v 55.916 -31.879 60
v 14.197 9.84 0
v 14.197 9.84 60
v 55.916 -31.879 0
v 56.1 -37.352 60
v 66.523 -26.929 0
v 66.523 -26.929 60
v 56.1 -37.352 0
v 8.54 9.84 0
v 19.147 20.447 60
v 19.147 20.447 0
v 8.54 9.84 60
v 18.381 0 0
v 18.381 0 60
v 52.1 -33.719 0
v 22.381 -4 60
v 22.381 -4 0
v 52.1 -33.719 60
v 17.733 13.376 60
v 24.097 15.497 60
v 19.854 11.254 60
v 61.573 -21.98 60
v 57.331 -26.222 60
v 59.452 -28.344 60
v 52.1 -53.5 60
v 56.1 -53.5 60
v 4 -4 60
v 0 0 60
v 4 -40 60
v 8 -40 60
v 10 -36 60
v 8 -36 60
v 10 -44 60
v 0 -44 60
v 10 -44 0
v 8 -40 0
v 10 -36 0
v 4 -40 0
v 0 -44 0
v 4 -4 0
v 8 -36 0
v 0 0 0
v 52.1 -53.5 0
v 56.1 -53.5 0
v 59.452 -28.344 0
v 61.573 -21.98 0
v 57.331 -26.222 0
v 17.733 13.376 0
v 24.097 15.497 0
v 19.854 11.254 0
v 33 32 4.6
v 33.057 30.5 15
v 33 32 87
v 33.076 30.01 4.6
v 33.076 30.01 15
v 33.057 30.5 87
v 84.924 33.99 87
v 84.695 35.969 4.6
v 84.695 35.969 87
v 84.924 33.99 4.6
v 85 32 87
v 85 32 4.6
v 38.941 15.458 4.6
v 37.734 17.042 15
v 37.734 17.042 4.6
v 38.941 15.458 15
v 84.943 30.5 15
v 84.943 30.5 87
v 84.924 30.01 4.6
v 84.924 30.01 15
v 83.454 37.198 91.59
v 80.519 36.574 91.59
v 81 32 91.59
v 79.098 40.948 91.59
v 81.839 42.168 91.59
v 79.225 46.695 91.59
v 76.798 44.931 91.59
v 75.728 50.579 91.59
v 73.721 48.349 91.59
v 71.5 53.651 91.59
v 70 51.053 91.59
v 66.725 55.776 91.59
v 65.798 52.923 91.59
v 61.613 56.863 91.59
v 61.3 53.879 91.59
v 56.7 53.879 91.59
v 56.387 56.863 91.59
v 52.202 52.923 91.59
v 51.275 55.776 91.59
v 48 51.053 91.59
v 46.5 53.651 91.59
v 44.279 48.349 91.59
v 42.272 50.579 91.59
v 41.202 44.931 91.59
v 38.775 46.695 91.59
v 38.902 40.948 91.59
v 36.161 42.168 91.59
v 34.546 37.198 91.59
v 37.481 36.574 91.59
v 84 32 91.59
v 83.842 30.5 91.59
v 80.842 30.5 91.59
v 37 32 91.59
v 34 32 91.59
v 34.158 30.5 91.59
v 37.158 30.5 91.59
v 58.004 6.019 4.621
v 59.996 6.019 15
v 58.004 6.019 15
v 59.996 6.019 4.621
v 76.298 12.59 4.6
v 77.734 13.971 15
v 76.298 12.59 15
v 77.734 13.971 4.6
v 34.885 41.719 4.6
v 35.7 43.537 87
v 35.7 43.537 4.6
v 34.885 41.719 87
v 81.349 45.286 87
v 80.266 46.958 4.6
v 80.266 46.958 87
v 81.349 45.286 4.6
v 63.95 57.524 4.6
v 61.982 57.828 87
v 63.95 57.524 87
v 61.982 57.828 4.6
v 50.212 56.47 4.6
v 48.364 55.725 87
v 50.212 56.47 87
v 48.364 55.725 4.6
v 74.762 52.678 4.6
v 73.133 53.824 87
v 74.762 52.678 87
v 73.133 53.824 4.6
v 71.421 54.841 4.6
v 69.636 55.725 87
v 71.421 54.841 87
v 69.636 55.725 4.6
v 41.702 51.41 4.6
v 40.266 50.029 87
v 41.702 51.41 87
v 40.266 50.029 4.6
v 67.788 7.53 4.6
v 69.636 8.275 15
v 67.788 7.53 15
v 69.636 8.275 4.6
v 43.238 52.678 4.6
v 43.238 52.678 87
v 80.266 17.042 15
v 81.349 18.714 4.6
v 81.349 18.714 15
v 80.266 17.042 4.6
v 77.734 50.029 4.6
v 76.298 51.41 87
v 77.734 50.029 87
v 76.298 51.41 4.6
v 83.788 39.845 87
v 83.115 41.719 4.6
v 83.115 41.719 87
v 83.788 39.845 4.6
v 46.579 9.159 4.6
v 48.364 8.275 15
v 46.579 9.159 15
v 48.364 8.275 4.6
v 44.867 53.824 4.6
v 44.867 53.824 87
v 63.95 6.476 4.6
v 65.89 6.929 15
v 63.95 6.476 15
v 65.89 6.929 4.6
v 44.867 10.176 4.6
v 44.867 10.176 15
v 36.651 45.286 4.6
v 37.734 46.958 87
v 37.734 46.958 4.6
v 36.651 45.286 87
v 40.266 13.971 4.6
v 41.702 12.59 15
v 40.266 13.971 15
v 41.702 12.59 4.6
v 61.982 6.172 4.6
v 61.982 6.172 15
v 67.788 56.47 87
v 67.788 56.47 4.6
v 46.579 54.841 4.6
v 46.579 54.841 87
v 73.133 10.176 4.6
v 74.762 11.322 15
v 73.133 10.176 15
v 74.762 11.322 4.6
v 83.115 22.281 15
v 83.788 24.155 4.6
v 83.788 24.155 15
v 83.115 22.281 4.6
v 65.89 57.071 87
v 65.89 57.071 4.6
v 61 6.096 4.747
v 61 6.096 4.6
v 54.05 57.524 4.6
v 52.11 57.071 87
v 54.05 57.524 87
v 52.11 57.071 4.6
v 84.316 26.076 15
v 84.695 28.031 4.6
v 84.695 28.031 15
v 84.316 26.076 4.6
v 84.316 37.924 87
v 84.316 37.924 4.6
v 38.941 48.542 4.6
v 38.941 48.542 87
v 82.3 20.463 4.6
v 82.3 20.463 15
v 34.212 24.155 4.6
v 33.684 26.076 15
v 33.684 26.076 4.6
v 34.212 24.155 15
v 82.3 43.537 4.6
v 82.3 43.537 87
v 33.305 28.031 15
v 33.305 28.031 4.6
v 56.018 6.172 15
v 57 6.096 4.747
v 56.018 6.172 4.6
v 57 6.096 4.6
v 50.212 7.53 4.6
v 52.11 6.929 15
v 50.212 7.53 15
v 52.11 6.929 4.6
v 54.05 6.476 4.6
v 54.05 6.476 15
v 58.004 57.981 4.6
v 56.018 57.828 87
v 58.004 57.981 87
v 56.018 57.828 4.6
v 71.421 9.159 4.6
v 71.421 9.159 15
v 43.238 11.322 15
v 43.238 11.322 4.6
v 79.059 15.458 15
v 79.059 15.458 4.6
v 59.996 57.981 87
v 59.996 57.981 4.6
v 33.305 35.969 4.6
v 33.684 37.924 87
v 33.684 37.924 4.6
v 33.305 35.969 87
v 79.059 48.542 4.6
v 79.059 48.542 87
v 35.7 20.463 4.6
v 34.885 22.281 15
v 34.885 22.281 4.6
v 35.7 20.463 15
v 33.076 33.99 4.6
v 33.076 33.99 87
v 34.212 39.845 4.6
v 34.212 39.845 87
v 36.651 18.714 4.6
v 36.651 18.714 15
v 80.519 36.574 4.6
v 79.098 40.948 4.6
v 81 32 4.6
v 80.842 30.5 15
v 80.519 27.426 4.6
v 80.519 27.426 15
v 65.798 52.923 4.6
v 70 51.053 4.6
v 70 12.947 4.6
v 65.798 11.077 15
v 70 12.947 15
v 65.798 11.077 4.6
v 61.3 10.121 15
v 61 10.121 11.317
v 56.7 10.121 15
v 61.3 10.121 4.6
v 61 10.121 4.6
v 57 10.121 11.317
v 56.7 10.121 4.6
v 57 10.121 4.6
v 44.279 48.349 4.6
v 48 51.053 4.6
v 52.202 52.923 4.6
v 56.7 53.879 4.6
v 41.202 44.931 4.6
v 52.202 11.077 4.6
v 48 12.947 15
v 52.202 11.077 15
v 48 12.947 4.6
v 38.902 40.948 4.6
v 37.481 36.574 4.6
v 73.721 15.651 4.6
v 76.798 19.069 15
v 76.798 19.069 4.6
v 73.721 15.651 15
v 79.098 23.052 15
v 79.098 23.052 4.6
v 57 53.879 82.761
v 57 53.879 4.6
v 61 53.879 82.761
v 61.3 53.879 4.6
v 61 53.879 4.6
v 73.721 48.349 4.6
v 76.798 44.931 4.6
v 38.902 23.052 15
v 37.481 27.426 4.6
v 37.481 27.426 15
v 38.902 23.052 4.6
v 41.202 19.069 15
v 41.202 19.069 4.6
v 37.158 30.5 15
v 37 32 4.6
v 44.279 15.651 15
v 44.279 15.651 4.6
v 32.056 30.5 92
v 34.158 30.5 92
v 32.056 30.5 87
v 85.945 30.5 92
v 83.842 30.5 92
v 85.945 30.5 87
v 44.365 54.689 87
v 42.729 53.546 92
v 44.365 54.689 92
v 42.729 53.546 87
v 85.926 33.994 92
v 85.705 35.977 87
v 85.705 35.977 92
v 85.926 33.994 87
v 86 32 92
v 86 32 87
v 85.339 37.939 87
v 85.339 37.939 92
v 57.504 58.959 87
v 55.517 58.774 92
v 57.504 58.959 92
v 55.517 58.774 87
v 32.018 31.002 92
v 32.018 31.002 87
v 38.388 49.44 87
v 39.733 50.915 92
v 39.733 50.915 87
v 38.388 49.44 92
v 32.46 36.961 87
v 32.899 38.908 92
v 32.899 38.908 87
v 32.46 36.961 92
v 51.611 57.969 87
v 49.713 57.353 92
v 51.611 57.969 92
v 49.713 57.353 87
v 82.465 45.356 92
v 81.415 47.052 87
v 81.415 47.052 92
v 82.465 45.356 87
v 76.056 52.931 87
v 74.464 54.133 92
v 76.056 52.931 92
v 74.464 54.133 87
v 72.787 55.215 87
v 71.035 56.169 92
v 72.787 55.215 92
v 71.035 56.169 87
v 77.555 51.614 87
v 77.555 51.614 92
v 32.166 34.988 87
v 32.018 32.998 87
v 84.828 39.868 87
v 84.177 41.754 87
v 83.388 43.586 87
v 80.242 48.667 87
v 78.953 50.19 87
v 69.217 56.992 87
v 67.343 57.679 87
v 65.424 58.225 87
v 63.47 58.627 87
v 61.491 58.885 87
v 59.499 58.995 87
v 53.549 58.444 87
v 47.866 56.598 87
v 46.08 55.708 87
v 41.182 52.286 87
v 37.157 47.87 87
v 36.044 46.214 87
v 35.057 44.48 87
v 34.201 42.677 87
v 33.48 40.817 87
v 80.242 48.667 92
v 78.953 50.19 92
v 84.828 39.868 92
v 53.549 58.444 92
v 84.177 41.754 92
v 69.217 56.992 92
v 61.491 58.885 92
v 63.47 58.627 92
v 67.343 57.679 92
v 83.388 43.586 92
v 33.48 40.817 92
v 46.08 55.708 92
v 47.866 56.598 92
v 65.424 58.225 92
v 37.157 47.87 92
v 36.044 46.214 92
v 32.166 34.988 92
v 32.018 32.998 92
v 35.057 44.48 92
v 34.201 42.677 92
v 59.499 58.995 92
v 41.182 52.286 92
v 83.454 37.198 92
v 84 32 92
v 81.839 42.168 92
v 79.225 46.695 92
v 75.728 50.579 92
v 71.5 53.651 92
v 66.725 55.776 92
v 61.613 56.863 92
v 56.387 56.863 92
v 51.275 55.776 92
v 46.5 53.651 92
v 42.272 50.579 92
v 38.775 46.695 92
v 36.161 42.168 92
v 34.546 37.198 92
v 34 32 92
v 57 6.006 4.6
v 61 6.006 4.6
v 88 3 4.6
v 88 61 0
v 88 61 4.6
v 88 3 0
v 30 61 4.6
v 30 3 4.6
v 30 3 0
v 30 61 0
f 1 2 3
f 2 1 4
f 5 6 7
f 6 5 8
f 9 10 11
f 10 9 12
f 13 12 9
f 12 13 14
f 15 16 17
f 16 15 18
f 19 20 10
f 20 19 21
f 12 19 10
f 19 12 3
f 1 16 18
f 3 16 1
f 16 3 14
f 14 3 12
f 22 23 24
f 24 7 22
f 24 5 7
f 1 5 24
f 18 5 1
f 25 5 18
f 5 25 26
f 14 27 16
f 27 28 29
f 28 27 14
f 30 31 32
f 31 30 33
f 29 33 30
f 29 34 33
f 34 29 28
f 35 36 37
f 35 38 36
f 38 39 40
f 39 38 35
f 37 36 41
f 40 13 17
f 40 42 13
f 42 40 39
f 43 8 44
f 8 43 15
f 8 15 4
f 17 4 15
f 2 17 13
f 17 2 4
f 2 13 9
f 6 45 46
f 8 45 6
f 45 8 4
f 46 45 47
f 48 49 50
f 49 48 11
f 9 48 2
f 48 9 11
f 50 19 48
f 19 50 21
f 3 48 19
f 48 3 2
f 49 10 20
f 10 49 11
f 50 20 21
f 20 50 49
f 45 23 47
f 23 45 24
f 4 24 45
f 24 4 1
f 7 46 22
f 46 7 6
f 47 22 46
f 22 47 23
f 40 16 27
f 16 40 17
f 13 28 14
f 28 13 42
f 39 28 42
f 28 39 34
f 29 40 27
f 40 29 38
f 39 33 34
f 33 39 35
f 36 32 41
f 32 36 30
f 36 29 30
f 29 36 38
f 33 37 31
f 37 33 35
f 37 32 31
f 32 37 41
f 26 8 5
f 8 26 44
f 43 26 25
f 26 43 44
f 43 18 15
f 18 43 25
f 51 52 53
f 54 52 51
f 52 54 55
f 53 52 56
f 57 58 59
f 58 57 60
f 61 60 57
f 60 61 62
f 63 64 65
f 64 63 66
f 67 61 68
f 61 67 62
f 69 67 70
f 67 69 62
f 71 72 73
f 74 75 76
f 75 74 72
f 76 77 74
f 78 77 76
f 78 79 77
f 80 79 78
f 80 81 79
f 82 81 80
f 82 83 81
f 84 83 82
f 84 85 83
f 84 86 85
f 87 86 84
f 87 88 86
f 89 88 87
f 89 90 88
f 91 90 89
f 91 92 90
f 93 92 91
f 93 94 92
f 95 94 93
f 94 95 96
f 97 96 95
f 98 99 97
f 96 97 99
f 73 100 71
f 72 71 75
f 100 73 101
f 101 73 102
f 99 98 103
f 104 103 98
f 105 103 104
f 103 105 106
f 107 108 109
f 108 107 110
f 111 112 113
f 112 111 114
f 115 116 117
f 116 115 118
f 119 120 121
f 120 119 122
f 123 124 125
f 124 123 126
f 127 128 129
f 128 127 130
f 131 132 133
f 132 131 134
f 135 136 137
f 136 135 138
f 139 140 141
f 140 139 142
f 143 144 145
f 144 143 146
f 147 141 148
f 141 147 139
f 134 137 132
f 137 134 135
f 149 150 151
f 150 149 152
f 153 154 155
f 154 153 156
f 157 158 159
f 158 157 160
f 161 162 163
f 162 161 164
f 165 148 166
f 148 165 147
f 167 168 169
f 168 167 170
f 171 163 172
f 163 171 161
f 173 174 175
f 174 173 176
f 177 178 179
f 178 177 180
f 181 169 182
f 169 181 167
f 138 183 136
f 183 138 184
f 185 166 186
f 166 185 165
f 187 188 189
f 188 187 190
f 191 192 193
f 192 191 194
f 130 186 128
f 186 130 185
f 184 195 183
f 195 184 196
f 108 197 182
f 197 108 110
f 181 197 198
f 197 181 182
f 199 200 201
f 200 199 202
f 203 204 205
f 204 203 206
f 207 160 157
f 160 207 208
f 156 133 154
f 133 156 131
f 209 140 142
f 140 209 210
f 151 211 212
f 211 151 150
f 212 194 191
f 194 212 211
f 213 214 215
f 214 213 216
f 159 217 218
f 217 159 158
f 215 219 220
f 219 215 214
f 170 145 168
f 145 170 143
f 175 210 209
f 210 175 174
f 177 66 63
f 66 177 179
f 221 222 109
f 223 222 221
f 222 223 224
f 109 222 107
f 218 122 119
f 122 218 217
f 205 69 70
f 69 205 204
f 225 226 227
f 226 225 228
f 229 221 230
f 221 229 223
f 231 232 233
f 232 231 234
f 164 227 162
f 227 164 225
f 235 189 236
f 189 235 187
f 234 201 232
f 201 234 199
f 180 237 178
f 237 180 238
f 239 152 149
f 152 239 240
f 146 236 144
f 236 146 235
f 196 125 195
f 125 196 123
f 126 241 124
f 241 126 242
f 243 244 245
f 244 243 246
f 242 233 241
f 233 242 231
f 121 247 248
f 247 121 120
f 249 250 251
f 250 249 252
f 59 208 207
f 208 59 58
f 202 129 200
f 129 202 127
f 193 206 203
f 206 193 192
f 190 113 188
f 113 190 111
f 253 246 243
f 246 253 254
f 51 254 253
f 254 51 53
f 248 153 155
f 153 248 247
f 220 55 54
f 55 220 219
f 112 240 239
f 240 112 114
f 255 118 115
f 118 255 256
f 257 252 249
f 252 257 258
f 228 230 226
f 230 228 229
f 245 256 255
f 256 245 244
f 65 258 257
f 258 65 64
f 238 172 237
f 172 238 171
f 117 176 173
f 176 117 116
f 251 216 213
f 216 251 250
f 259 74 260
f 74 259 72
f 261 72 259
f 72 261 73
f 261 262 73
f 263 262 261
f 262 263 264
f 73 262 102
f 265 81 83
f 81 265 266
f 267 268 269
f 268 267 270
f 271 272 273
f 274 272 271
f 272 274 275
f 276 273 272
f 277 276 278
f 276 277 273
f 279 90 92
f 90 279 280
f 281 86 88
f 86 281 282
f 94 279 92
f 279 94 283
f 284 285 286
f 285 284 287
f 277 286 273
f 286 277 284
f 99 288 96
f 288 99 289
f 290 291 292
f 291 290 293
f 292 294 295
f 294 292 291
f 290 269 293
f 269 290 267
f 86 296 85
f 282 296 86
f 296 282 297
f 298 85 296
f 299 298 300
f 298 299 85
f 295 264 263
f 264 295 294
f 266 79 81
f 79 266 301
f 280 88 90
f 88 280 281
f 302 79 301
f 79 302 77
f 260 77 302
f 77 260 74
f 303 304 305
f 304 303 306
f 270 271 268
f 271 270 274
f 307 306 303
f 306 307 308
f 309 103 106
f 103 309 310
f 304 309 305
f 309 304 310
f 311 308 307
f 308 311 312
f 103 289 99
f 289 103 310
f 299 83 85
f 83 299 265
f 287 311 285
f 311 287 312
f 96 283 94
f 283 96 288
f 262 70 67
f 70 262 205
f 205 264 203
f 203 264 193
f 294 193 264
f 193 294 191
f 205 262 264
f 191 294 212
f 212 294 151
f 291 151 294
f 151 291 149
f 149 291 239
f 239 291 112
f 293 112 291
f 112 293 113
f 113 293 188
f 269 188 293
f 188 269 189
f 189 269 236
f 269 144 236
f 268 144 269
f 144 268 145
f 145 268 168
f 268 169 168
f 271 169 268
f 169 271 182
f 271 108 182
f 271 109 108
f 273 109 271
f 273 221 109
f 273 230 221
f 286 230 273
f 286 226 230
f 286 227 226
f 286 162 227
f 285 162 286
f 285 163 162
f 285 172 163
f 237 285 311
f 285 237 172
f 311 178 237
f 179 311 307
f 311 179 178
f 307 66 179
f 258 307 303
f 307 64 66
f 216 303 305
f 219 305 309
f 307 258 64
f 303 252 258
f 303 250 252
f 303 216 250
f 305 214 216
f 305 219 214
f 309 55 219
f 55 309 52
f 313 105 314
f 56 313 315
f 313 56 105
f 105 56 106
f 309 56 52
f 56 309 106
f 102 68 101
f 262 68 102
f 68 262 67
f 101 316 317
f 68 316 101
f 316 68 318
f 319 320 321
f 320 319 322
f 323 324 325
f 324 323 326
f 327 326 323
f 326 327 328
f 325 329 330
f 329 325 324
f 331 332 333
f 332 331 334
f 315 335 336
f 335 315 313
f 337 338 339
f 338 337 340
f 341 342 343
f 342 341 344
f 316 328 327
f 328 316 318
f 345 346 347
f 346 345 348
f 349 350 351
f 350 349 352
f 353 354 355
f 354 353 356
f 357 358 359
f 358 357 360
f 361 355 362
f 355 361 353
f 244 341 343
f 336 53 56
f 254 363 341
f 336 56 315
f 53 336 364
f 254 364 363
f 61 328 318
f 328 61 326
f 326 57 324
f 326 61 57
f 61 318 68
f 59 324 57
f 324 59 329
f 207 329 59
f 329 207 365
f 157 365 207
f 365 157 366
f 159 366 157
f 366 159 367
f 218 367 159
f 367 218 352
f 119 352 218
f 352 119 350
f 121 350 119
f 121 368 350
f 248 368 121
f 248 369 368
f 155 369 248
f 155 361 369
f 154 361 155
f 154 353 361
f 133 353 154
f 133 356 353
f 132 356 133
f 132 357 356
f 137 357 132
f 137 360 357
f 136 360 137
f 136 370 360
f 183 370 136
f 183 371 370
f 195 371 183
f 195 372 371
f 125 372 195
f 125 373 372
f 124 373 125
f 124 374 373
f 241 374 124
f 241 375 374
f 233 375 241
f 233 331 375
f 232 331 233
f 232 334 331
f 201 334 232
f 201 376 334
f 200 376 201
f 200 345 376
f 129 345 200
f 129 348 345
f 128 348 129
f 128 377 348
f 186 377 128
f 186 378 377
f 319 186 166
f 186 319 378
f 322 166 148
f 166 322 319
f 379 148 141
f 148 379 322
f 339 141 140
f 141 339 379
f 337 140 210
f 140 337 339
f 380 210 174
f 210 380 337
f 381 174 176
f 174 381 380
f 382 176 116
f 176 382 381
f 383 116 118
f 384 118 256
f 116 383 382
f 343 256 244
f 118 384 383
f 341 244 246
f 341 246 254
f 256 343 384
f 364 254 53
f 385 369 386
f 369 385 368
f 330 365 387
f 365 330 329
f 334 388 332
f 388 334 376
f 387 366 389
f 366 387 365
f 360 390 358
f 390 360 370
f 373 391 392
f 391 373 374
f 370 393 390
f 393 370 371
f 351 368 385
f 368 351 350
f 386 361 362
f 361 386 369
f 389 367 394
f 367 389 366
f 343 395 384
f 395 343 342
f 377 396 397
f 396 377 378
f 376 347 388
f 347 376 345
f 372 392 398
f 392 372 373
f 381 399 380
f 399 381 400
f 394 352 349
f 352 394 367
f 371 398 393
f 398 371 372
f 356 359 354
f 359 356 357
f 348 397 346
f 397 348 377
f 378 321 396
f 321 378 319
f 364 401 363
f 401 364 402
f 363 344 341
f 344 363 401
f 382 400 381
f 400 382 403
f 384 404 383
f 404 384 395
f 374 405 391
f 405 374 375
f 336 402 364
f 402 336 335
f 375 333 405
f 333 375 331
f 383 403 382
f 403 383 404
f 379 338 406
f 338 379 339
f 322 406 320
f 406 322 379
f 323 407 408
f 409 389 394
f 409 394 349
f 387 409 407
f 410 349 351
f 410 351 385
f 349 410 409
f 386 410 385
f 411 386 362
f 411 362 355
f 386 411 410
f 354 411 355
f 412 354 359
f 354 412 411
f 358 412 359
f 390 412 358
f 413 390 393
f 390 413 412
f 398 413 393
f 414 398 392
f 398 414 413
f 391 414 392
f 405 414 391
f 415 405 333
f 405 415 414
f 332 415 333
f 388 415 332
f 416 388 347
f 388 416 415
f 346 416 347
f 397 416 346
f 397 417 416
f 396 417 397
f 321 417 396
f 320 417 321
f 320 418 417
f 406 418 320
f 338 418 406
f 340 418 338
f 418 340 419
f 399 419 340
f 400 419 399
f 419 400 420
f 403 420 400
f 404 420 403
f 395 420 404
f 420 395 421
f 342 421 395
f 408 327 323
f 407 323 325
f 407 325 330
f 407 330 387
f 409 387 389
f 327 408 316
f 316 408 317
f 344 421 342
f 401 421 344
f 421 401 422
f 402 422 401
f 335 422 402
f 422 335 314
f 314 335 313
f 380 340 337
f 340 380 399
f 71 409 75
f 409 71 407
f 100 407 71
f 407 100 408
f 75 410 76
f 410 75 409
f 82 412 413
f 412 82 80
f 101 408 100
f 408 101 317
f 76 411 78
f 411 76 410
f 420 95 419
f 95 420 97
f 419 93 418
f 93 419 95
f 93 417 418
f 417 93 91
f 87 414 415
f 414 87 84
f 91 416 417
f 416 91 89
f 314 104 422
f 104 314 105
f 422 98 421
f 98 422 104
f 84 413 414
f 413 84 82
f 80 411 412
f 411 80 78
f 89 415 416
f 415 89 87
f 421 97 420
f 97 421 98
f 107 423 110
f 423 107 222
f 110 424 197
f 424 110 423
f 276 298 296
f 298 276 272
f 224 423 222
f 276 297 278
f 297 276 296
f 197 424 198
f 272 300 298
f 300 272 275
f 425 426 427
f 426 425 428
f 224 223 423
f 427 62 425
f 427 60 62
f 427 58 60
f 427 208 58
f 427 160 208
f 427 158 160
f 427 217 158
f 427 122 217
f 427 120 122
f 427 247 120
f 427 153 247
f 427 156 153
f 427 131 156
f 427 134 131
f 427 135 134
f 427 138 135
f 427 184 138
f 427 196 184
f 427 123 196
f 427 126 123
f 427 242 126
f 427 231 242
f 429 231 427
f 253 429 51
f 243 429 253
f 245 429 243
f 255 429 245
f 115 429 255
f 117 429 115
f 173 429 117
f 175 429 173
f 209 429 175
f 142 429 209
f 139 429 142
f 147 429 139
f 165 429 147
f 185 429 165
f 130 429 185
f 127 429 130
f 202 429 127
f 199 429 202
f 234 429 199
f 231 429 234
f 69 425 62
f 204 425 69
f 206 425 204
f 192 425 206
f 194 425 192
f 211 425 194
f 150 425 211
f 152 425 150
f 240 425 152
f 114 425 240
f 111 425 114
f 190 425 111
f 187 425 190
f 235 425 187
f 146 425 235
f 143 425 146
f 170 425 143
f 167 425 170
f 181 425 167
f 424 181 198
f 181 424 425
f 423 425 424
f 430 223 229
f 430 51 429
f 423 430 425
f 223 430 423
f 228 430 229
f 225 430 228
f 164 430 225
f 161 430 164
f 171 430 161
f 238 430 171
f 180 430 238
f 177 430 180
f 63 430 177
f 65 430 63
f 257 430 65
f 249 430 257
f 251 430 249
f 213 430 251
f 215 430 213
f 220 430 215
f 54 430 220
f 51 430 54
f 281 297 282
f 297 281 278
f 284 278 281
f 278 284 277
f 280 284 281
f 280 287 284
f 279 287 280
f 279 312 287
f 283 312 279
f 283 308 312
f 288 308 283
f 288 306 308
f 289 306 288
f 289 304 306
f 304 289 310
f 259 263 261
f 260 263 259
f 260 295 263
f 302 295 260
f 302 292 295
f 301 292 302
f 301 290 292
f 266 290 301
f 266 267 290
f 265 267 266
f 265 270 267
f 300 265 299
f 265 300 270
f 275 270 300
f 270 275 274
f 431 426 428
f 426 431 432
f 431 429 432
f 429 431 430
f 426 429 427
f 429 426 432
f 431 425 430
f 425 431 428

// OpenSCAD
/* Uses OpenSCAD 2012.04.04

Parametric Replicator Spool Holder
==================================

Based on http://www.thingiverse.com/thing:20710

Modified for the Makerbot Replicator 5th Generation.
Updated to allow re-use of the clip.

This program renders 2 parts which allow for the mounting of non-standard spools on the Makerbot Replicator 5th Generation.

Part 1 is a right hand side wall support panel which clips around the top support wall.

Part 2 is a mounting tube and base which slides into the wall support panel and allows for the mounting of
the spool.

Both Part 1 and 2 can be customised for spools by changing the value of variables below.

The main variables which need to be customised are:

	SpoolHoleDiameter
	SpoolDepth

The "Layout" variable can be set to "Both", "Wall" or "Spool" to render the parts required for printing.

The Part 1 wall support panel can be Mirrored in ReplicatorG or Makerware to print for the right hand side spool.

*/

/* [Global] */

// What do you want to print?
part = "Both";	  //  [Both:Both, Wall:Wall, Spool:Spool]

// Do you want an angled spool?
angled = "yes";  //  [yes, no]

// Diameter of Hole in Center of Spool (52.0 for Makerbot)?
SpoolHoleDiameter = 52.0;  // Settings for Makerbot Spools.

// Width of Spool (80.0 for Makerbot)?
SpoolDepth = 80.0;

/////////////////////////////////////////////////////////////////////////////////////////////////////////////////

print_part();

module print_part() {
	if (part == "Both") {
       if (angled == "yes") {
         AngledWallSupport();
       } else {
		  WallSupport();
       }
		SpoolSupport();
	} else if (part == "Wall") {
		if (angled == true) {
         AngledWallSupport();
       } else {
		  WallSupport();
       }
	} else {
		SpoolSupport();
	}
}

/*
===========  OpenSCAD Shapes Library (www.openscad.at)
===========  Copyright (C) 2009  Catarina Mota <clifford@clifford.at>
*/


module tube(height, radius, wall) {
	difference(){
		cylinder(height, radius, radius,$fa=1);
		cylinder(height, radius-wall, radius-wall);
	}
}

module box(w,h,d) {
	scale ([w,h,d]) cube(1, true);
}

//-----------------------
//MOVES THE ROTATION AXIS OF A BOX FROM ITS CENTER TO THE BOTTOM LEFT CORNER
module dislocateBox(w,h,d){
	translate([w/2,h,0]){
		difference(){
			box(w, h*2, d+1);
			translate([-w,0,0]) box(w, h*2, d+1);
		}
	}
}


module rightTriangle(adjacent, opposite, depth) {
	difference(){
		translate([-adjacent/2,opposite/2,0]) box(adjacent, opposite, depth);
		translate([-adjacent,0,0]){
			rotate([0,0,atan(opposite/adjacent)]) dislocateBox(adjacent*2, opposite, depth);
		}
	}
}
/*
  ==============================================================================
   MAIN CODE
  ==============================================================================
*/

//--  Standard Build Variables.
SideTrackWidth = 3.0 * 1;
SideTrackHeight = 5.0 * 1;
SideTopHeight = 6.0 * 1;
TubeThickness = 4.0 * 1;
TubeCollarWidth = 5.0 * 1;
TubeCollarHeight = 2.0 * 1;
TubeBaseClearance = 3.0 * 1;									// Space between edge of baseplate and tube.
TubeBaseSlippage = 0.5 * 1;									// Slippage between tube base plate and side rail.


//--  Calculated Dimensions

SpoolPrintOffset = 30 * 1;									// Offset of Spool from Wall Support for print layout

SpoolBaseplateDepth = SideTrackHeight - 0.4;
SpoolBaseplateXorY = 52.0 + (TubeBaseClearance * 2);

//-- Wall Support Panel.

module WallSupport() {
  overhang_x = 48.1;
  overhang_z = 36;
  clip_x = 4;
  clip_y = 60;
  clip_z = 4;

  wall_thickness = 4;

  support_slider_gap = 5;
  support_slider_edge_thickness = 6;
  support_slider_edge_z = 3;
  support_slider_z = 59;
  support_z = support_slider_z + (wall_thickness * 2);

  translate([24,-3,0]) {
  rotate([90, 0, 0]) {
    cube([overhang_x + wall_thickness, clip_y, wall_thickness]);

    translate([0,0,wall_thickness])
      cube([wall_thickness, clip_y, overhang_z + wall_thickness]);

    translate([0,0,overhang_z + wall_thickness])
      cube([clip_x + wall_thickness, clip_y, wall_thickness]);

    translate([clip_x + wall_thickness, 0, overhang_z])
      cube([2, clip_y, clip_z + wall_thickness]);

    translate([overhang_x + wall_thickness, 0, 0])
      cube([wall_thickness, clip_y, support_z]);

    translate([overhang_x + (wall_thickness * 2), 0, 0])
      cube([support_slider_gap, clip_y, wall_thickness]);

    translate([overhang_x + (wall_thickness * 2) + support_slider_gap, 0, 0])
      cube([support_slider_edge_thickness, clip_y, support_slider_edge_z + wall_thickness]);

    translate([overhang_x + (wall_thickness * 2), 0, support_z - wall_thickness])
      cube([support_slider_gap, clip_y, wall_thickness]);

    translate([overhang_x + (wall_thickness * 2) + support_slider_gap, 0, support_z - (support_slider_edge_z + wall_thickness)])
      cube([support_slider_edge_thickness, clip_y, support_slider_edge_z + wall_thickness]);
  }}
}


module AngledWallSupport() {
  overhang_x = 48.1;
  overhang_z = 36;
  clip_x = 4;
  clip_y = 60;
  clip_z = 4;

  wall_thickness = 4;

  support_slider_gap = 5;
  support_slider_edge_thickness = 6;
  support_slider_edge_z = 3;
  support_slider_z = 59;
  support_z = support_slider_z + (wall_thickness * 2);

  rotate([90, 0, 0]) {
    cube([20 + wall_thickness, clip_y, wall_thickness]);

    translate([0,0,wall_thickness])
      cube([wall_thickness, clip_y, overhang_z + wall_thickness]);

    translate([0,0,overhang_z + wall_thickness])
      cube([clip_x + wall_thickness, clip_y, wall_thickness]);

    translate([clip_x + wall_thickness, 0, overhang_z])
      cube([2, clip_y, clip_z + wall_thickness]);

    translate([overhang_x + wall_thickness, 0, 33.5])
      cube([wall_thickness, clip_y, 20]);

    translate([-28.3, 0, 27]) {
      rotate([0,45,0]){
        translate([overhang_x + wall_thickness, 0, 0])
          cube([wall_thickness, clip_y, support_z]);

        translate([overhang_x + (wall_thickness * 2), 0, 0])
          cube([support_slider_gap, clip_y, wall_thickness]);

        translate([overhang_x + (wall_thickness * 2) + support_slider_gap, 0, 0])
          cube([support_slider_edge_thickness, clip_y, support_slider_edge_z + wall_thickness]);

        translate([overhang_x + (wall_thickness * 2), 0, support_z - wall_thickness])
          cube([support_slider_gap, clip_y, wall_thickness]);

        translate([overhang_x + (wall_thickness * 2) + support_slider_gap, 0, support_z - (support_slider_edge_z + wall_thickness)])
          cube([support_slider_edge_thickness, clip_y, support_slider_edge_z + wall_thickness]);
      }
    }
  }
}

module BasePlate() {

	color("red") translate([SpoolPrintOffset, SideTrackWidth, 0])
	cube([SpoolBaseplateXorY,SpoolBaseplateXorY,SpoolBaseplateDepth]);
  
}

module MainTube() {
	
 	difference(){ 
	
    	color("Yellow") 
		translate([SpoolPrintOffset + (SpoolBaseplateXorY /2.0),SideTrackWidth + (SpoolBaseplateXorY / 2.0),SpoolBaseplateDepth-0.01])
		tube(SpoolDepth + SideTopHeight + 1.0,SpoolHoleDiameter/2.0,TubeThickness);
		
		color("Orange") 
		//  Leave 15mm lower collar to strengthen printing.
    	translate([SpoolPrintOffset,0,15])
		cube([SpoolBaseplateXorY,(SpoolBaseplateXorY  + TubeBaseClearance)/2,SpoolDepth  + SideTopHeight + 1.0 + TubeCollarWidth ]);
  }
}

module UpperCollar() {

	difference(){ 
    	color("SkyBlue")
 		translate([SpoolPrintOffset + (SpoolBaseplateXorY /2.0),SideTrackWidth + (SpoolBaseplateXorY / 2.0),SpoolDepth  + SideTopHeight + 1.0])
		tube(TubeCollarWidth,(SpoolHoleDiameter + TubeCollarHeight)/2.0,TubeCollarHeight);
		
    	translate([SpoolPrintOffset,0,0])
		cube([SpoolBaseplateXorY,(SpoolBaseplateXorY  + TubeBaseClearance)/2,SpoolDepth + SideTopHeight + 1.0 +TubeCollarWidth]);
  }
}

module SupportTriangle() {

	color("pink");
    y_offset = (SpoolBaseplateXorY - SpoolHoleDiameter) / 2.0;
	translate([SpoolPrintOffset + (SpoolBaseplateXorY /2.0),SpoolBaseplateXorY - y_offset,SpoolBaseplateDepth-0.01]) rotate ([0,90,180])
	rightTriangle(SpoolDepth,SpoolHoleDiameter - TubeBaseClearance,TubeThickness);

}

//--	Spool Tube and support base.

module SpoolSupport() {

	BasePlate();
	MainTube();
	UpperCollar();
	SupportTriangle();
}
